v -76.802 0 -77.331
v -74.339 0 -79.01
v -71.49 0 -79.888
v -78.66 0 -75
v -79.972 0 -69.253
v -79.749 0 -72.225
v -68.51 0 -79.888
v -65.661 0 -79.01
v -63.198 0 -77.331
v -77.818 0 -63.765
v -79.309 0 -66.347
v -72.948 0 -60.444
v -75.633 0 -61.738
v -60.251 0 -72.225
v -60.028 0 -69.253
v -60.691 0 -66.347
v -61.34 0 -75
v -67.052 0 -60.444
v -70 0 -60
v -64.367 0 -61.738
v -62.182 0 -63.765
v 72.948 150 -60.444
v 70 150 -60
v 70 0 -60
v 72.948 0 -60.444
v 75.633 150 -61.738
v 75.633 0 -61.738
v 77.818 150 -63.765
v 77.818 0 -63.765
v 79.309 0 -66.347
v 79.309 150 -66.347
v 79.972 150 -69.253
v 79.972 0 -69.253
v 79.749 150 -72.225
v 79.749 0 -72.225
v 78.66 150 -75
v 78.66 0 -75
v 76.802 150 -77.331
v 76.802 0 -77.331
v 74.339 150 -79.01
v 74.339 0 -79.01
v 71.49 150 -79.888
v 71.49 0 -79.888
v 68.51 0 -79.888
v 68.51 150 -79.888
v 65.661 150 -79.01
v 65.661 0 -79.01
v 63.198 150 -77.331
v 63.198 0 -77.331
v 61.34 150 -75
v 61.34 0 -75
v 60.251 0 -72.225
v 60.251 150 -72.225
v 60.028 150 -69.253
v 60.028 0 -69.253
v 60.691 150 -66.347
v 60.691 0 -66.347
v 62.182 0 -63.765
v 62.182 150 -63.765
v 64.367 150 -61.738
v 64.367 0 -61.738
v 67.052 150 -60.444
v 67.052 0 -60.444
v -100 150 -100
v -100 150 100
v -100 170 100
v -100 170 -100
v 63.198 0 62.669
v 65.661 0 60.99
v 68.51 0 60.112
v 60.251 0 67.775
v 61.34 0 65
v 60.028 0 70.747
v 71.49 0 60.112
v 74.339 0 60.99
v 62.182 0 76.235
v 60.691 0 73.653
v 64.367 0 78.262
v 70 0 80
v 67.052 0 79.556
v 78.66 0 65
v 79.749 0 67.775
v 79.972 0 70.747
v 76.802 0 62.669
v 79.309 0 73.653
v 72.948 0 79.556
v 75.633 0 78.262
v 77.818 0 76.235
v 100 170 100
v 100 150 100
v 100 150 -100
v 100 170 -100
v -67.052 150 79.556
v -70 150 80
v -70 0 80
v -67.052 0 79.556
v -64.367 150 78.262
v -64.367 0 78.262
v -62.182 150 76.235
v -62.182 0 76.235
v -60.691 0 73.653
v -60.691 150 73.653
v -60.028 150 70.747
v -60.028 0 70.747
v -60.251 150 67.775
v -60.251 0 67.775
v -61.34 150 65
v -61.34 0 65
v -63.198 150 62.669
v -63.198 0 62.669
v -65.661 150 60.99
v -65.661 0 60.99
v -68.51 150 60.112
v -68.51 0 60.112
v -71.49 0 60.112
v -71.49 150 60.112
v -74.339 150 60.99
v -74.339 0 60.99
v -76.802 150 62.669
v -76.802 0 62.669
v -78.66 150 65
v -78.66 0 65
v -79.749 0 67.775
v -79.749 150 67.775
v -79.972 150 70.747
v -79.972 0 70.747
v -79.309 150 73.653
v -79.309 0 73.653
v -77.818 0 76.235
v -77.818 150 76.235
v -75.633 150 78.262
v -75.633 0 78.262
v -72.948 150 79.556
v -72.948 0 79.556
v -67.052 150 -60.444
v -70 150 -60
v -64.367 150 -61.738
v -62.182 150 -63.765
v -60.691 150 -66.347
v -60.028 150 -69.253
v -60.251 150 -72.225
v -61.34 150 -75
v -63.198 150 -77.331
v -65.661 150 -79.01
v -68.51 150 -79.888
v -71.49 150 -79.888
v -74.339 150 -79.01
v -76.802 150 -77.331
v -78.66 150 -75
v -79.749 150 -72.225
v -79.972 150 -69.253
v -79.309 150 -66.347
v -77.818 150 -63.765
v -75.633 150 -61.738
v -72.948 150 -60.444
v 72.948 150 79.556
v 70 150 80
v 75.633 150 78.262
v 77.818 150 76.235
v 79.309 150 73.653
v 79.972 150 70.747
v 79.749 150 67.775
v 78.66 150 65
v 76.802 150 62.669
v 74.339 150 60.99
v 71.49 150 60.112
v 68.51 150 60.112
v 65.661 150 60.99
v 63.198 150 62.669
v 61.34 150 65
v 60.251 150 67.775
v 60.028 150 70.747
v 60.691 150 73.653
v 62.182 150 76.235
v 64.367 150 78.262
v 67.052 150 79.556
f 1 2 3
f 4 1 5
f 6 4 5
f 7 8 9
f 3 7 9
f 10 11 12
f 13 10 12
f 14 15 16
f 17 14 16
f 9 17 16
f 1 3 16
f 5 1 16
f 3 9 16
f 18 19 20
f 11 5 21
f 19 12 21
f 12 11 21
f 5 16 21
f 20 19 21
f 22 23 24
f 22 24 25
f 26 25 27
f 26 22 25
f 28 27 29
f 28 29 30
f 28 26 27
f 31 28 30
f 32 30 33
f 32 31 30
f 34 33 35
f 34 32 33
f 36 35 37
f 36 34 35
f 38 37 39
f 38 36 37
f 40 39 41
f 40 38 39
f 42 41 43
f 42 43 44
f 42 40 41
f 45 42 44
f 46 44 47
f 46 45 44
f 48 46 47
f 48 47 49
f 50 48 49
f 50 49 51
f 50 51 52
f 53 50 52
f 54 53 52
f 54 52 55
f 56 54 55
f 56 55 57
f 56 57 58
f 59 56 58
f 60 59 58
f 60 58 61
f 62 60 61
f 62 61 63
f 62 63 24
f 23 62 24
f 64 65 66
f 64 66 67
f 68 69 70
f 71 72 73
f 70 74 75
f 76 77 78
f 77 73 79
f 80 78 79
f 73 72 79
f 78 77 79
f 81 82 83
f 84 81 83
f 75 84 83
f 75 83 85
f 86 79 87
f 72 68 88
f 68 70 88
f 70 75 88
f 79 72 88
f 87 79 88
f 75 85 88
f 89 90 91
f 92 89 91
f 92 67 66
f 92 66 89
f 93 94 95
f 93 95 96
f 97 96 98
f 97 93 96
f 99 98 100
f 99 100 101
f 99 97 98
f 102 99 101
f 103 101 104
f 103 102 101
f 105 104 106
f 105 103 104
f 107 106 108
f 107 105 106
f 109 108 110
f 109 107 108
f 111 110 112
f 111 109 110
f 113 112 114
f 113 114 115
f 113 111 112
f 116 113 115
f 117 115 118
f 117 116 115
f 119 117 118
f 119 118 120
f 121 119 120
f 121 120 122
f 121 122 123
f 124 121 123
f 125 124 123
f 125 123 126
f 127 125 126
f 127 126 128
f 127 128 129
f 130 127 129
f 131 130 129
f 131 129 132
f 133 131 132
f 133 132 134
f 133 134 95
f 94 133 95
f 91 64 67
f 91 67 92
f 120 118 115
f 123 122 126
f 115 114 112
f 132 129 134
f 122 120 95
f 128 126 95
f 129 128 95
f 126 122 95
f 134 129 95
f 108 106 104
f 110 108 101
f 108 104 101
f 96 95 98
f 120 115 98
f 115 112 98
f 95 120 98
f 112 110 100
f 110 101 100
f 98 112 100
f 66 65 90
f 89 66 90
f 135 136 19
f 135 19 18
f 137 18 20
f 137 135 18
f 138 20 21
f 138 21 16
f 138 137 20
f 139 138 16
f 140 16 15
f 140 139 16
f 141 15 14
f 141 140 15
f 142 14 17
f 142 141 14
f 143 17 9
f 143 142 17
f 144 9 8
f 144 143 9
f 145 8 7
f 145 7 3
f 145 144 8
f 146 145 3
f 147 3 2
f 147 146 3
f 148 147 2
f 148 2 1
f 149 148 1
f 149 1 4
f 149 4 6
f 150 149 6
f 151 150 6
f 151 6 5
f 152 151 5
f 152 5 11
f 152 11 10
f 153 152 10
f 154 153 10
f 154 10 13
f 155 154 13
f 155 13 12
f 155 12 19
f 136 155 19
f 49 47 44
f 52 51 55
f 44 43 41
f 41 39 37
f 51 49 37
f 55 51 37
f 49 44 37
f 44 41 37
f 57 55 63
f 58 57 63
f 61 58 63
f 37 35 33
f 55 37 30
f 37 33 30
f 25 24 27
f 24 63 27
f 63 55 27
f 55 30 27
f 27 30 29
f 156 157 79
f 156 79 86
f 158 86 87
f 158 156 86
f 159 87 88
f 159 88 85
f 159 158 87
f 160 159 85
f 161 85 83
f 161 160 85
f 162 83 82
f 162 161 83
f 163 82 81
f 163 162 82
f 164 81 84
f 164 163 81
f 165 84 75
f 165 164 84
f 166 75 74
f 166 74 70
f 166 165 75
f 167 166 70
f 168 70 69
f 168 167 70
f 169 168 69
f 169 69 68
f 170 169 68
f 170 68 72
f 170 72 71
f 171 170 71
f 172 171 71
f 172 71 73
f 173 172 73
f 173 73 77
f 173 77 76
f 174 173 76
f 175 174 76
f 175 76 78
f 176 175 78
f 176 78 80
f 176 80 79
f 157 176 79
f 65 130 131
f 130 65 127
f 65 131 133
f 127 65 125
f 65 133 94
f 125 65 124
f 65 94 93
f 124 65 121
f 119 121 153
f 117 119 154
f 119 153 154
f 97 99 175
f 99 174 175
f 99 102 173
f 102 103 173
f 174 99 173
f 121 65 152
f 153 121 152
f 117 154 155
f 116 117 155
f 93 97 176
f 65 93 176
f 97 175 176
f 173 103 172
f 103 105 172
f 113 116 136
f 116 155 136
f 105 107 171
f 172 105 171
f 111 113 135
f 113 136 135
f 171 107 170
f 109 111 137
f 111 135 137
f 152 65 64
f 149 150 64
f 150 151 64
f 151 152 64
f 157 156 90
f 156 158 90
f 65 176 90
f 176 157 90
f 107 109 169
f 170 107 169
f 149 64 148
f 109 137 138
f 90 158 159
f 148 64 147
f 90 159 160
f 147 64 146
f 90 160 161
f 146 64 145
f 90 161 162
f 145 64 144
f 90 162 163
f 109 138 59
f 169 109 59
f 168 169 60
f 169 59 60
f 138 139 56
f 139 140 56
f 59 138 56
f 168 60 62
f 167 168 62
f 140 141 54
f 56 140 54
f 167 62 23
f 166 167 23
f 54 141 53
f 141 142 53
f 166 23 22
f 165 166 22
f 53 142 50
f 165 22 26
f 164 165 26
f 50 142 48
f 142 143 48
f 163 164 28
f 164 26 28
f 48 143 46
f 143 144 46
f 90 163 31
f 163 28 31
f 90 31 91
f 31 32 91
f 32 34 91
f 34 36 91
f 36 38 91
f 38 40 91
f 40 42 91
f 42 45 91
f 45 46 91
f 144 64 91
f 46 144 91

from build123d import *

# Parameters (mm, degrees)
SKETCH_1_W      = 200
SKETCH_1_H      = 200
EXTRUDE_1_DEPTH = 20
SKETCH_2_R      = 10
EXTRUDE_2_DEPTH = 152


with BuildPart() as part:
    # 草图1 → 凸台-拉伸1 (new body)
    with BuildSketch(Plane(origin=(0, 150, 0), x_dir=(1, 0, 0), z_dir=(0, 1, 0))):
        Rectangle(SKETCH_1_W, SKETCH_1_H)
    extrude(amount=EXTRUDE_1_DEPTH)

    # 草图2 → 凸台-拉伸2 (add)
    with BuildSketch(Plane(origin=(0, 152, 0), x_dir=(1, 0, 0), z_dir=(0, 1, 0))):
        with Locations(Location((-70, 70, 0), (0, 0, 270))):
            Circle(SKETCH_2_R)
        with Locations(Location((70, 70, 0), (0, 0, 270))):
            Circle(SKETCH_2_R)
        with Locations(Location((-70, -70, 0), (0, 0, 270))):
            Circle(SKETCH_2_R)
        with Locations(Location((70, -70, 0), (0, 0, 270))):
            Circle(SKETCH_2_R)
    extrude(amount=-EXTRUDE_2_DEPTH)


solid = part.part
